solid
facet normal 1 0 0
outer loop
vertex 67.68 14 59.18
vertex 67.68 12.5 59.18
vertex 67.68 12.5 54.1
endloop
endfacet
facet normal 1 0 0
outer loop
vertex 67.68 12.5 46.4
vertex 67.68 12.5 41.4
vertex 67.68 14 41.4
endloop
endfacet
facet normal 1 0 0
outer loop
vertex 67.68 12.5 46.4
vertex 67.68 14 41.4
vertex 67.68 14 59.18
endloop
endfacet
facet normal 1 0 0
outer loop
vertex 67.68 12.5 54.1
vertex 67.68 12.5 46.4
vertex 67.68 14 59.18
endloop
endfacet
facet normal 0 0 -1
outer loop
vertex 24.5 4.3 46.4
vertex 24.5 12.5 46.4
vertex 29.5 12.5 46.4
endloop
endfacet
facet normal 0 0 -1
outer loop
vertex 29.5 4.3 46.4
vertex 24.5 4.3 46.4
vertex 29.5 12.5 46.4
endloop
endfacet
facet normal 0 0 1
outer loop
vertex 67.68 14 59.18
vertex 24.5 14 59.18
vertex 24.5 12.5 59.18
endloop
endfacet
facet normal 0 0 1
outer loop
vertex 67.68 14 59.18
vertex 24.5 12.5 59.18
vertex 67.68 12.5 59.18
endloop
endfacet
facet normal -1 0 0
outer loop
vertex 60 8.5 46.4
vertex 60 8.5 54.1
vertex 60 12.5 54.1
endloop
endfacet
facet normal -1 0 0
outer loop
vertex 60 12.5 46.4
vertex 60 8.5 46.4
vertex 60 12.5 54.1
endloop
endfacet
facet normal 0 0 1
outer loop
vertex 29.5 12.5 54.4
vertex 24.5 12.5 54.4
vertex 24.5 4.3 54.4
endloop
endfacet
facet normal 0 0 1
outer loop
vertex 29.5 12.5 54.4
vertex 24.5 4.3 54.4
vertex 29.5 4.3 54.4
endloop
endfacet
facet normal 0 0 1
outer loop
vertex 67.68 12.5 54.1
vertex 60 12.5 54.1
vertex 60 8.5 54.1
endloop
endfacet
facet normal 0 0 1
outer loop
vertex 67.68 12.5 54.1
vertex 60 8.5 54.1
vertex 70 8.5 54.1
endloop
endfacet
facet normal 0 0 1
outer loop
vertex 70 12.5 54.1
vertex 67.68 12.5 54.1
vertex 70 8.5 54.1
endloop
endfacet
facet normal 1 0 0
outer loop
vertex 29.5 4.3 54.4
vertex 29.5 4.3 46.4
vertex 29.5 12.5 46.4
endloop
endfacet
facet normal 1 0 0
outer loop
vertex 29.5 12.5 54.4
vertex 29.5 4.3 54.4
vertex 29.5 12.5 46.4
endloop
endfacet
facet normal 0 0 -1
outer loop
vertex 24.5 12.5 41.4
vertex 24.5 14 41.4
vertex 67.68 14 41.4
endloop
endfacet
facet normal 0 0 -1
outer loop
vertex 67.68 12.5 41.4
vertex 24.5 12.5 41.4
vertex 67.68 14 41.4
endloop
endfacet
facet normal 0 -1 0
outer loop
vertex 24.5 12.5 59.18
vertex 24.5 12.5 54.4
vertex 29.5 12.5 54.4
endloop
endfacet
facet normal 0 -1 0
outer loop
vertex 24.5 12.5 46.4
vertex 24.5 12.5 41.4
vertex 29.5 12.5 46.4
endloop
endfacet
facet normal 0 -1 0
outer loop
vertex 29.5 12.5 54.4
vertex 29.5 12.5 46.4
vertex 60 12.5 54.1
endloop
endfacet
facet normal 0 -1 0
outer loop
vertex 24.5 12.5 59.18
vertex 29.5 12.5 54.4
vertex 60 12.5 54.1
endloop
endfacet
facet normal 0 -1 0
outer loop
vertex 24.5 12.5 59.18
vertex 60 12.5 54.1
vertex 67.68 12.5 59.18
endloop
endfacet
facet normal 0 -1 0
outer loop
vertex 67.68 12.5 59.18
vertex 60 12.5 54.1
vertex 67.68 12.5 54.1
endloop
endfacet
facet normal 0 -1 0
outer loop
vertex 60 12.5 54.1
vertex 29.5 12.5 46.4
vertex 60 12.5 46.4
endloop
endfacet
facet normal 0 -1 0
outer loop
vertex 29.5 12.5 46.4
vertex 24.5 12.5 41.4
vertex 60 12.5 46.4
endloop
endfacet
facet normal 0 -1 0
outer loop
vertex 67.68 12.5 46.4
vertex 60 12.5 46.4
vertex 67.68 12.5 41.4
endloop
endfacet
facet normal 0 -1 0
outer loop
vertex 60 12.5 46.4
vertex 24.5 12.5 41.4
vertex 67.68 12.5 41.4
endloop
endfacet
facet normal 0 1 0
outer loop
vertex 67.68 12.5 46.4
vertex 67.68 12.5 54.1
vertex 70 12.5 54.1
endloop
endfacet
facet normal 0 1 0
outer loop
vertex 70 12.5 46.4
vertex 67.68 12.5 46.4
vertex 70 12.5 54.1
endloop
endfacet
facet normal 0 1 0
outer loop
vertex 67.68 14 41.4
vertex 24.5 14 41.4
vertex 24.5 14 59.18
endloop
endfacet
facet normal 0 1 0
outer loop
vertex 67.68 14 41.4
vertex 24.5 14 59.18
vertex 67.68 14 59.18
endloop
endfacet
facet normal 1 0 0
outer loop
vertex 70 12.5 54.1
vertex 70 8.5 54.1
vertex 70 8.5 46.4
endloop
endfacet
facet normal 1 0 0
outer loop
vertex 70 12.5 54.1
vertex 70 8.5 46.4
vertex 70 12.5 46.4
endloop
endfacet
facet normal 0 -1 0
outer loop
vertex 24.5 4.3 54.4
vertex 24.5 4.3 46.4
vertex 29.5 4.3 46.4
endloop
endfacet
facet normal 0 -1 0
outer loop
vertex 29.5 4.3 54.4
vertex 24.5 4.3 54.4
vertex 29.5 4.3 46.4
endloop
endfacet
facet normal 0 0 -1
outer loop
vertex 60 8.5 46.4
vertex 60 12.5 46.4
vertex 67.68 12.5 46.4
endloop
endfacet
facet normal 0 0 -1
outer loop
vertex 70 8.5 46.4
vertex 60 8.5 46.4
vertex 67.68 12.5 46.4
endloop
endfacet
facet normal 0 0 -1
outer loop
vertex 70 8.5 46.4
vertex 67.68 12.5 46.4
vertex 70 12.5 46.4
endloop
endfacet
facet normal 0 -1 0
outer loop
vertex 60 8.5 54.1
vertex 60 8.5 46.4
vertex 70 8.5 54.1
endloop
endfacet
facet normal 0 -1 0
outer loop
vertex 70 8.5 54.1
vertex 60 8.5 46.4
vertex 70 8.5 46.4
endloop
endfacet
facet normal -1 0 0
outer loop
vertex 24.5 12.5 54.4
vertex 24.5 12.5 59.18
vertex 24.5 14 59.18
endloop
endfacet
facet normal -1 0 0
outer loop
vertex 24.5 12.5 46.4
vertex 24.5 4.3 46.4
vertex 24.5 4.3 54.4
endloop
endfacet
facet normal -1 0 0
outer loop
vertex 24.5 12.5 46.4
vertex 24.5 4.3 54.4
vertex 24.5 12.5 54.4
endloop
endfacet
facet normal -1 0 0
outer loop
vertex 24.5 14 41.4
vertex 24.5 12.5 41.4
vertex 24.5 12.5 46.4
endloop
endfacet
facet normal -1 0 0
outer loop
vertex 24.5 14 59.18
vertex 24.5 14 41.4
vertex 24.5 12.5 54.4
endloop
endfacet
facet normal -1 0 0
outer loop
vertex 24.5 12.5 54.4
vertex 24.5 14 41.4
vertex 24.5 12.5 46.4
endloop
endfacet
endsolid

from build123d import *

# Parameters (mm, degrees)
BOX058_W     = 10
BOX058_H     = 4
BOX058_DEPTH = 7.7
BOX057_W     = 43.18
BOX057_H     = 1.5
BOX057_DEPTH = 17.78
BOX069_W     = 5
BOX069_H     = 8.2
BOX069_DEPTH = 8


with BuildPart() as cube057:
    # Box058 → Box058 (new body)
    with BuildSketch(Plane(origin=(34, 18.5, 47), x_dir=(1, 0, 0), z_dir=(0, 0, 1))):
        with Locations((5, 2)):
            Rectangle(BOX058_W, BOX058_H)
    extrude(amount=BOX058_DEPTH)


with BuildPart() as fusion025:
    # Box057 → Box057 (new body)
    with BuildSketch(Plane(origin=(-1.5, 22.5, 42), x_dir=(1, 0, 0), z_dir=(0, 0, 1))):
        with Locations((21.59, 0.75)):
            Rectangle(BOX057_W, BOX057_H)
    extrude(amount=BOX057_DEPTH)

    # Fusion017: union Cube057
    add(cube057.part)


with BuildPart() as arduino:
    # Box069 → Box069 (new body)
    with BuildSketch(Plane(origin=(-1.5, 14.3, 47), x_dir=(1, 0, 0), z_dir=(0, 0, 1))):
        with Locations((2.5, 4.1)):
            Rectangle(BOX069_W, BOX069_H)
    extrude(amount=BOX069_DEPTH)

    # Fusion020: union Fusion025
    add(fusion025.part)


with BuildPart() as arduino_1:
    # Fusion020 placement: moved
    add(arduino.part.moved(Location((26, -10, -0.6))))


solid = arduino_1.part
